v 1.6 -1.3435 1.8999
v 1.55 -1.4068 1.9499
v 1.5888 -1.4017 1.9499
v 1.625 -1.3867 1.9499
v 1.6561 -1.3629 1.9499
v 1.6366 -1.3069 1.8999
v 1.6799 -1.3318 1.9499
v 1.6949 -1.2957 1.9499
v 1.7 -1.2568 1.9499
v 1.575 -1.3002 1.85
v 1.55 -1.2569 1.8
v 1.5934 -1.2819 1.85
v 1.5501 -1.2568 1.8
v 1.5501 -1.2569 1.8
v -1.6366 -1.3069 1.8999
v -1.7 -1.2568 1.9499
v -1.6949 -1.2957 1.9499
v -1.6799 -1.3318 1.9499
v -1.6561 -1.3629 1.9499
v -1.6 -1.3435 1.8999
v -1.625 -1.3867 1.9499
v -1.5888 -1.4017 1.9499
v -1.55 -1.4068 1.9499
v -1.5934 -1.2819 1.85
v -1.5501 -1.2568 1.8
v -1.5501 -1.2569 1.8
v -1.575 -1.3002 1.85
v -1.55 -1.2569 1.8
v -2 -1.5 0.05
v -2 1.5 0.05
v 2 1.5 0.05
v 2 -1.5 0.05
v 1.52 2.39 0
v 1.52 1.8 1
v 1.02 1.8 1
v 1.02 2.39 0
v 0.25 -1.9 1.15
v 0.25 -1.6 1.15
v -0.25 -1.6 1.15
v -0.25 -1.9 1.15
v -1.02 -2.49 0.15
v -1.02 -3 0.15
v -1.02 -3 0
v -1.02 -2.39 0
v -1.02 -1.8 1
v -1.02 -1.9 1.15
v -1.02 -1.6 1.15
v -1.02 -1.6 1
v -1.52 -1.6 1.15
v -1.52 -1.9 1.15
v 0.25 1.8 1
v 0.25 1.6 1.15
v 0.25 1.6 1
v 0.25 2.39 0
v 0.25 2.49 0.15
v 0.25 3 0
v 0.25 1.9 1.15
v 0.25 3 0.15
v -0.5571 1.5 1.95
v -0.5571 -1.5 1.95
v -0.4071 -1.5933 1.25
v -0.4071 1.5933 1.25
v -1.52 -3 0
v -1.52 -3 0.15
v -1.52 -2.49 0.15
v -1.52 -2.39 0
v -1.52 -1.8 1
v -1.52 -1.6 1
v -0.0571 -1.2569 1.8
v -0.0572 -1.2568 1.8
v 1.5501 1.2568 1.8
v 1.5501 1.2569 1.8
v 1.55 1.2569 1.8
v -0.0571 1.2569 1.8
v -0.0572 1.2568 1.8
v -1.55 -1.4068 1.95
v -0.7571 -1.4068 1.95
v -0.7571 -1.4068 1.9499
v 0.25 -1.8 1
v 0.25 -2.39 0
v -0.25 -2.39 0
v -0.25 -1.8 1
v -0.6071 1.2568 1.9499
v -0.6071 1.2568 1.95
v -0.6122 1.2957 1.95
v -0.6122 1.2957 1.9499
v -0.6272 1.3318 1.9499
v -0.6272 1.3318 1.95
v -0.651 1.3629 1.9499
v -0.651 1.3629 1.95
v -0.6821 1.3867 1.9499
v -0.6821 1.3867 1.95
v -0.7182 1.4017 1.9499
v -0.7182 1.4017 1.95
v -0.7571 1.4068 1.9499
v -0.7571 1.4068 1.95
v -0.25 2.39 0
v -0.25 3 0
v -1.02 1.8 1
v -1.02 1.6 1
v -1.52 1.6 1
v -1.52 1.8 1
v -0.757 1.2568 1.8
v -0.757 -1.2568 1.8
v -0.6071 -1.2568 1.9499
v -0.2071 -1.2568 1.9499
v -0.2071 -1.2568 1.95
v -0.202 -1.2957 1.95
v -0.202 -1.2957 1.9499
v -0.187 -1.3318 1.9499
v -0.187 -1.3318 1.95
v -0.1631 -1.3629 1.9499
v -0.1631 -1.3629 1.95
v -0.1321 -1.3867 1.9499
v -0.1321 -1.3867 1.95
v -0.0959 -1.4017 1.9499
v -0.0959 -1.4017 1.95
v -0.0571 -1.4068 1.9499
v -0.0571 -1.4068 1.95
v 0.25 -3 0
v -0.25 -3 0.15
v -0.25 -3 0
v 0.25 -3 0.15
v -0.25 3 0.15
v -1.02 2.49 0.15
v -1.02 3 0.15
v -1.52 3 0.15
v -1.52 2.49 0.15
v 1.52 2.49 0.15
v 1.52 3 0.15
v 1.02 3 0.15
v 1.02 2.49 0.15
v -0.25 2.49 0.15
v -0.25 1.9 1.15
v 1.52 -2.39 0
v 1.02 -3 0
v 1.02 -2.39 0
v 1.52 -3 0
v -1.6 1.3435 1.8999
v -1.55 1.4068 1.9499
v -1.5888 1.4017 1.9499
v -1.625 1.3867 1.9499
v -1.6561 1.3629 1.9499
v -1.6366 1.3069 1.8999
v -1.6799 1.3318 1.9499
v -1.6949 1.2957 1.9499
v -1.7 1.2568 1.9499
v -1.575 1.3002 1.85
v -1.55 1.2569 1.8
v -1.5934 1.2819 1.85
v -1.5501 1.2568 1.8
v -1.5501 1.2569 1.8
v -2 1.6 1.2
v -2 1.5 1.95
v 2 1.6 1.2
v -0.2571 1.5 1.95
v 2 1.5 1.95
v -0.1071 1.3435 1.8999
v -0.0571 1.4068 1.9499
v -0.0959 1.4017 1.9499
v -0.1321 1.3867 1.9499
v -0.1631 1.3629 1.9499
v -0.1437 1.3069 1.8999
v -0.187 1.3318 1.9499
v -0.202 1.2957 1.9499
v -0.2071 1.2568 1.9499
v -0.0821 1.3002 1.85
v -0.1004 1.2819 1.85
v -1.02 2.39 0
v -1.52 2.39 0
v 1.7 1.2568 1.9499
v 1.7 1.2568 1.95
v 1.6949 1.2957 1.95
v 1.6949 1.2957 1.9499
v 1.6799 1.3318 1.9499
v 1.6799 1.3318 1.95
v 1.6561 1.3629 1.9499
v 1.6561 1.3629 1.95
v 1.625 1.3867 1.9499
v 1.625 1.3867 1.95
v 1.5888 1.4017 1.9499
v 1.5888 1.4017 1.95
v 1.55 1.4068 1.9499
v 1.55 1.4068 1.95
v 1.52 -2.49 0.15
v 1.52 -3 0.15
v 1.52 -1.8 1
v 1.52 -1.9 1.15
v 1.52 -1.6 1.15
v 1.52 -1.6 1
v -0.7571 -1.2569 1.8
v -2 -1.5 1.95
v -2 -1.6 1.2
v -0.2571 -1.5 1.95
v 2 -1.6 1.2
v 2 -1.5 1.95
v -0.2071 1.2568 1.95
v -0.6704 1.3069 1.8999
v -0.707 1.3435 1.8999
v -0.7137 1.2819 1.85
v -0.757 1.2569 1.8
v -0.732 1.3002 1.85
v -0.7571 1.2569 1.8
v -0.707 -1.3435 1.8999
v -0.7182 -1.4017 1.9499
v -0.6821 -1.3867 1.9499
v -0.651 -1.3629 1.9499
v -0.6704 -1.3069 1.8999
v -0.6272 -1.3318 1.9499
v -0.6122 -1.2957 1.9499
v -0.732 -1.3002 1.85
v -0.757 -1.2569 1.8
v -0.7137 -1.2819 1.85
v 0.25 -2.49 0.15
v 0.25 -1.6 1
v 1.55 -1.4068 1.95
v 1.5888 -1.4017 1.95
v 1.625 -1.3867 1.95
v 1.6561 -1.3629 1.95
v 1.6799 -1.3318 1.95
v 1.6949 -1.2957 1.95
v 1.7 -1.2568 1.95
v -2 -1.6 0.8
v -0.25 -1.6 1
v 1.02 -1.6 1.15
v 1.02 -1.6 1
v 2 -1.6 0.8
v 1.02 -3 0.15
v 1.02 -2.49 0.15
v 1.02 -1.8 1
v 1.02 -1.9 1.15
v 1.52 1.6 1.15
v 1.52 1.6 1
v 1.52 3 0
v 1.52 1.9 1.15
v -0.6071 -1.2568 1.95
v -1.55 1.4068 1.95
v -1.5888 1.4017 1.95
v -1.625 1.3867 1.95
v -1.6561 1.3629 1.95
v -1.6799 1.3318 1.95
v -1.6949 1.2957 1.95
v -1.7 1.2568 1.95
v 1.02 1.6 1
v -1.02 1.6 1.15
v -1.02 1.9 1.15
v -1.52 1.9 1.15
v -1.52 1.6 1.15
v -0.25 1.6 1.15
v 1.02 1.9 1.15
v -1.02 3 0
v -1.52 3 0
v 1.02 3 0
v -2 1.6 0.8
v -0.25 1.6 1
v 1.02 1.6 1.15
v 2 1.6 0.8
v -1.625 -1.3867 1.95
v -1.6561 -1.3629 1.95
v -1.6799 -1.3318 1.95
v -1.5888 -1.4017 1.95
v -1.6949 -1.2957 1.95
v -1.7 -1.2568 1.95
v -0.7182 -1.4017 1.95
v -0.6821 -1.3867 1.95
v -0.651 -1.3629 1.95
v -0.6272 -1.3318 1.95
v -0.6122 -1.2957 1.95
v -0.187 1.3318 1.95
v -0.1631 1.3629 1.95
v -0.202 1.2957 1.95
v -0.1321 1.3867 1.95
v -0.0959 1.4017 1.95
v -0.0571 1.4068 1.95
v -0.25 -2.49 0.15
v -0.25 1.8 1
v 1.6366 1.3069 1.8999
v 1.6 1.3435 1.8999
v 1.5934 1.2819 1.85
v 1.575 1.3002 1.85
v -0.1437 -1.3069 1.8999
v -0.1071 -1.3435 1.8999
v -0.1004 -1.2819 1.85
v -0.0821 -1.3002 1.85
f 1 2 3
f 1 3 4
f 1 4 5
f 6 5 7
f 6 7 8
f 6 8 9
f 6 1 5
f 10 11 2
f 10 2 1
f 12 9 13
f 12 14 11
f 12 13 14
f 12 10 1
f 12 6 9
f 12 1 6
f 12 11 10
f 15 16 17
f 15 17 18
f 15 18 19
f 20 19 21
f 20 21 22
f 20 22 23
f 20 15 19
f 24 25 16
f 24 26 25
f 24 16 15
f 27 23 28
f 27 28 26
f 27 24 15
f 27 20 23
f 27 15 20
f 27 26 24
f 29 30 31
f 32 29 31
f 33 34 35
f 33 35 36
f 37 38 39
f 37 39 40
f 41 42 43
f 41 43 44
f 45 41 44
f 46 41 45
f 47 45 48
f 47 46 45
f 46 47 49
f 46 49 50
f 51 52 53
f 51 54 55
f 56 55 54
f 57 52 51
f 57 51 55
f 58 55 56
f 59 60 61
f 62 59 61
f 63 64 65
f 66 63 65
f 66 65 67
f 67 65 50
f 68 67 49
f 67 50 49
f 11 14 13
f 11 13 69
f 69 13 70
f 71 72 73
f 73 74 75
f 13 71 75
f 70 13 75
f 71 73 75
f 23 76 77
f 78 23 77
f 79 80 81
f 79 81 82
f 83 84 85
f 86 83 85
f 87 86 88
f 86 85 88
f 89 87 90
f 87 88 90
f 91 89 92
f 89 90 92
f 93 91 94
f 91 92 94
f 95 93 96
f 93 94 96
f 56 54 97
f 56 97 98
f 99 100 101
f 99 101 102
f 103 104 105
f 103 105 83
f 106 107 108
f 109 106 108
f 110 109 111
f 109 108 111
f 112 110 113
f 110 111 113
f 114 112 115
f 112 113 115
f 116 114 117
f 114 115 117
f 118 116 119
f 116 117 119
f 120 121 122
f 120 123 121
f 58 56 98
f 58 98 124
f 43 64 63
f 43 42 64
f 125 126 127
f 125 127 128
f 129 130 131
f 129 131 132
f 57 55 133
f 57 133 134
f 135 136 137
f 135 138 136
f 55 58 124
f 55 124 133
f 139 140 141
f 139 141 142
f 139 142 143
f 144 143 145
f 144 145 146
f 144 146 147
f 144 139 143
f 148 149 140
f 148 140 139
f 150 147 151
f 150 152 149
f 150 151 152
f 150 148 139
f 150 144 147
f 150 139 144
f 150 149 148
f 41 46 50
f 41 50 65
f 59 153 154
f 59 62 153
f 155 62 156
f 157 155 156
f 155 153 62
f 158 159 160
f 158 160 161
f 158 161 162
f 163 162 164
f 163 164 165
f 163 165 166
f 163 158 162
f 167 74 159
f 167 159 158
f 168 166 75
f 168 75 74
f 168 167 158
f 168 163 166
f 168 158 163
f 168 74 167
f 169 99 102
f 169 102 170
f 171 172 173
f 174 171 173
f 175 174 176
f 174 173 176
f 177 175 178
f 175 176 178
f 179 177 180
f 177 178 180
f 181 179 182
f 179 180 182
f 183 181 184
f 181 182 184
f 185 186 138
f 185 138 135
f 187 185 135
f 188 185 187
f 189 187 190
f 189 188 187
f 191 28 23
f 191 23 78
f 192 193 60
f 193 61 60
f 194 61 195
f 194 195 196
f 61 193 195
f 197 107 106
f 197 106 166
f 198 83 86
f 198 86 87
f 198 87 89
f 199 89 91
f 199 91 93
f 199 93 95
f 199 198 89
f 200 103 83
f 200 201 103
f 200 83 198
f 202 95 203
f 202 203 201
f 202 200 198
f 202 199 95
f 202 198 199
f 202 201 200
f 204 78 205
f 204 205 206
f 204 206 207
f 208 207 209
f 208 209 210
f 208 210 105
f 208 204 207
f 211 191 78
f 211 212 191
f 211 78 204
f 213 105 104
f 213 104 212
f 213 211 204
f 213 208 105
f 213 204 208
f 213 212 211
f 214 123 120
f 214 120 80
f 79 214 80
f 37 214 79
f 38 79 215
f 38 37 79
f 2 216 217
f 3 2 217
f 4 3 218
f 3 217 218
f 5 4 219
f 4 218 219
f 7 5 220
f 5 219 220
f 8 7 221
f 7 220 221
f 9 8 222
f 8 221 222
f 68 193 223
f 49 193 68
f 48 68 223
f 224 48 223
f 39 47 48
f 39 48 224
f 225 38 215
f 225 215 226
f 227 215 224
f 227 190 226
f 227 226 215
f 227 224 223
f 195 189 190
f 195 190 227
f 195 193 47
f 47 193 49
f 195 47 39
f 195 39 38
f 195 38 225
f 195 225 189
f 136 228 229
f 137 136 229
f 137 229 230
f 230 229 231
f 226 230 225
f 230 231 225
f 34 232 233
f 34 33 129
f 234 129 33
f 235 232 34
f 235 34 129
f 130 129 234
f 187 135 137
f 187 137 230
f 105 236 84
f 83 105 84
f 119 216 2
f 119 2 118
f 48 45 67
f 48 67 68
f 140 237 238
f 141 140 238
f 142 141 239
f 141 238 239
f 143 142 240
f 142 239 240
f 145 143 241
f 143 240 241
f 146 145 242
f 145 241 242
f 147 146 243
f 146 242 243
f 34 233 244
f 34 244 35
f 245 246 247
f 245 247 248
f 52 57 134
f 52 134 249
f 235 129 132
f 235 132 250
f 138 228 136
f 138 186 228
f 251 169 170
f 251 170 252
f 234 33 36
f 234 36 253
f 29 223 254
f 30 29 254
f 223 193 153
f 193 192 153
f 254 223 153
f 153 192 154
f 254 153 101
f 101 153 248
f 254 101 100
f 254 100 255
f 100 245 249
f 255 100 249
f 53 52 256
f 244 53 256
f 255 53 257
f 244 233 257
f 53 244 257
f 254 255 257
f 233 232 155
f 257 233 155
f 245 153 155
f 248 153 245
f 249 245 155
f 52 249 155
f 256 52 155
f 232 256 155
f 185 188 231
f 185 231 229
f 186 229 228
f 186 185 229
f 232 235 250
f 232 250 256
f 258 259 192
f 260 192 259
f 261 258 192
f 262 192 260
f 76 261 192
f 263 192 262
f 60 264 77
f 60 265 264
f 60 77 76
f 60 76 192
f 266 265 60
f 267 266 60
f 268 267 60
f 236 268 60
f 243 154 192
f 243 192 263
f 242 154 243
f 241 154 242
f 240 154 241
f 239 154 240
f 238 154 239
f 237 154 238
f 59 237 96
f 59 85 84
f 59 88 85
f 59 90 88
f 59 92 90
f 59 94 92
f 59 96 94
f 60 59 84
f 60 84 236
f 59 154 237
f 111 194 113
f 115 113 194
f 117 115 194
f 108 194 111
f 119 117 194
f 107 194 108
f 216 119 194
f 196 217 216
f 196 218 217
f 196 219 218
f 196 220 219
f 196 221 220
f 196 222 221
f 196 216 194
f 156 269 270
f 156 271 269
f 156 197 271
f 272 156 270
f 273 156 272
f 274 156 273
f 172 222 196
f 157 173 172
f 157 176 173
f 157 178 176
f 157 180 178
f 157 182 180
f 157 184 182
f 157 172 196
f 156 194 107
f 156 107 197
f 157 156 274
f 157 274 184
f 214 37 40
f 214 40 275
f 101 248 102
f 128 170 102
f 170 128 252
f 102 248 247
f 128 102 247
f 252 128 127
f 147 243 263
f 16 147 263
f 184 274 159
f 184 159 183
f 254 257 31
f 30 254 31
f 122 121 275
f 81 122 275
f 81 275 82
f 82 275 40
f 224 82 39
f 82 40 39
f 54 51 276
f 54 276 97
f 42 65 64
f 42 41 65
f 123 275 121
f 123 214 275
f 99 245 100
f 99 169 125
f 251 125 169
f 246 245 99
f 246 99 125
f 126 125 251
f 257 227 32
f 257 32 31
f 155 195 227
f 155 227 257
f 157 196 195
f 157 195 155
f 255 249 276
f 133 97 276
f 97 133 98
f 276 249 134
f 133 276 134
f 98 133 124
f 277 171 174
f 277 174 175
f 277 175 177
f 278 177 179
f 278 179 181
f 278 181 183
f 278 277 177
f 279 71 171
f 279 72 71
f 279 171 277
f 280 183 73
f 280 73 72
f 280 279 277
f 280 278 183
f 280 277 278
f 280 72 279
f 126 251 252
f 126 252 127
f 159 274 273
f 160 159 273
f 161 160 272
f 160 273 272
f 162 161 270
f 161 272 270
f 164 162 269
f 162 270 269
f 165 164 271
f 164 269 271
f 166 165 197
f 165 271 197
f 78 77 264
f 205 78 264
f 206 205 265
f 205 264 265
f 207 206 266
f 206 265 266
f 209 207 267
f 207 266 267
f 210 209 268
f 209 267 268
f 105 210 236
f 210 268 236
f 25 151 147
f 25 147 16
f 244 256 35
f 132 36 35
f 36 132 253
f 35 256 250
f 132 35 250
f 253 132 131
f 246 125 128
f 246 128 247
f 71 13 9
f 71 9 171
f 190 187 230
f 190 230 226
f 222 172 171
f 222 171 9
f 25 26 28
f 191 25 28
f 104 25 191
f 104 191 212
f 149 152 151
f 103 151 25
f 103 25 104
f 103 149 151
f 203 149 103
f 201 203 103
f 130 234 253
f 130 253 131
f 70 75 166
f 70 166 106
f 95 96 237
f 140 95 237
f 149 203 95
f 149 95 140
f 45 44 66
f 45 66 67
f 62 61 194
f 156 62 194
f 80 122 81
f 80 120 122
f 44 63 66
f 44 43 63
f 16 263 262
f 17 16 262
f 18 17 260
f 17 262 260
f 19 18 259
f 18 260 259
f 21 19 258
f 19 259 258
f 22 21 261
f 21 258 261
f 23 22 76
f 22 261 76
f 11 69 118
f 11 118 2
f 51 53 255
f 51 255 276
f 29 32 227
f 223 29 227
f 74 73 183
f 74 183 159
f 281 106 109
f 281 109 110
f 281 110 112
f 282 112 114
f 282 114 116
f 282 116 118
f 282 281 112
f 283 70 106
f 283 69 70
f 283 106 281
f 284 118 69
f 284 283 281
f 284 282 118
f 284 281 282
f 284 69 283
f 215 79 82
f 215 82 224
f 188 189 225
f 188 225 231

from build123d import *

# Parameters (mm, degrees)
PAD002_DEPTH    = 0.25
PAD003_DEPTH    = 0.25
SKETCH_W        = 4
SKETCH_H        = 3.2
PAD_DEPTH       = 0.95
POCKET_DEPTH    = 3.201
POCKET001_DEPTH = 0.15
POCKET002_DEPTH = 20
CHAMFER_SIZE    = 0.1499
PAD001_DEPTH    = 0.25


with BuildPart() as pad002:
    # Sketch003 → Pad002 (new body, symmetric)
    with BuildSketch(Plane.YZ):
        Polygon((-3, 0), (-2.39, 0), (-1.8, 1), (1.8, 1), (2.39, 0), (3, 0), (3, 0.15), (2.49, 0.15), (1.9, 1.15), (-1.9, 1.15), (-2.49, 0.15), (-3, 0.15), align=None)
    extrude(amount=PAD002_DEPTH, both=True)


with BuildPart() as pad003:
    # Sketch004 → Pad003 (new body, symmetric)
    with BuildSketch(Plane.YZ.offset(1.27)):
        Polygon((-3, 0), (-2.39, 0), (-1.8, 1), (1.8, 1), (2.39, 0), (3, 0), (3, 0.15), (2.49, 0.15), (1.9, 1.15), (-1.9, 1.15), (-2.49, 0.15), (-3, 0.15), align=None)
    extrude(amount=PAD003_DEPTH, both=True)


with BuildPart() as chamfer_body:
    # Sketch → Pad (new body, symmetric)
    with BuildSketch(Plane.XY.offset(1)):
        Rectangle(SKETCH_W, SKETCH_H)
    extrude(amount=PAD_DEPTH, both=True)

    # Sketch005 → Pocket (cut, through all)
    with BuildSketch(Plane(origin=(0, -1.6, 1), x_dir=(1, 0, 0), z_dir=(0, -1, 0))):
        Polygon((-0.557062, 0.95), (-0.407062, 0.25), (-0.257062, 0.95), align=None)
    extrude(amount=-POCKET_DEPTH, mode=Mode.SUBTRACT)

    # Sketch006 → Pocket001 (cut)
    with BuildSketch(Plane.XY.offset(1.95)):
        with BuildLine():
            Line((-0.757062, 1.406843), (-1.55, 1.406843))
            ThreePointArc((-1.55, 1.406843), (-1.656066, 1.362909), (-1.7, 1.256843))
            Line((-1.7, 1.256843), (-1.7, -1.256843))
            ThreePointArc((-1.7, -1.256843), (-1.656066, -1.362909), (-1.55, -1.406843))
            Line((-1.55, -1.406843), (-0.757062, -1.406843))
            ThreePointArc((-0.757062, -1.406843), (-0.650996, -1.362909), (-0.607062, -1.256843))
            Line((-0.607062, -1.256843), (-0.607062, 1.256843))
            ThreePointArc((-0.607062, 1.256843), (-0.650996, 1.362909), (-0.757062, 1.406843))
        make_face()
        with BuildLine():
            Line((-0.057062, 1.406843), (1.55, 1.406843))
            ThreePointArc((1.7, 1.256843), (1.656066, 1.362909), (1.55, 1.406843))
            Line((1.7, 1.256843), (1.7, -1.256843))
            ThreePointArc((1.55, -1.406843), (1.656066, -1.362909), (1.7, -1.256843))
            Line((1.55, -1.406843), (-0.057062, -1.406843))
            ThreePointArc((-0.207062, -1.256843), (-0.163128, -1.362909), (-0.057062, -1.406843))
            Line((-0.207062, -1.256843), (-0.207062, 1.256843))
            ThreePointArc((-0.057062, 1.406843), (-0.163128, 1.362909), (-0.207062, 1.256843))
        make_face()
    extrude(amount=-POCKET001_DEPTH, mode=Mode.SUBTRACT)

    # Sketch007 → Pocket002 (cut)
    with BuildSketch(Plane(origin=(2, 0, 1), x_dir=(0, 1, 0), z_dir=(1, 0, 0))):
        Polygon((-1.5, 0.95), (-1.6, 0.95), (-1.6, 0.2), align=None)
        Polygon((-1.6, -0.95), (-1.5, -0.95), (-1.6, -0.2), align=None)
        Polygon((1.6, 0.95), (1.6, 0.2), (1.5, 0.95), align=None)
        Polygon((1.6, -0.95), (1.6, -0.2), (1.5, -0.95), align=None)
    extrude(amount=-POCKET002_DEPTH, mode=Mode.SUBTRACT)

    # Chamfer
    chamfer_edges = [chamfer_body.edges().sort_by_distance(p)[0] for p in [
        (-1.7, 0, 1.8),
        (-1.656066, 1.362909, 1.8),
        (-1.153531, 1.406843, 1.8),
        (-0.163128, 1.362909, 1.8),
        (0.746469, 1.406843, 1.8),
        (-0.207062, 0, 1.8),
        (-1.656066, -1.362909, 1.8),
        (-1.153531, -1.406843, 1.8),
        (-0.650996, -1.362909, 1.8),
        (-0.163128, -1.362909, 1.8),
        (0.746469, -1.406843, 1.8),
        (1.656066, -1.362909, 1.8),
        (1.656066, 1.362909, 1.8),
        (1.7, 0, 1.8),
        (-0.650996, 1.362909, 1.8),
        (-0.607062, 0, 1.8),
    ]]
    chamfer(chamfer_edges, length=CHAMFER_SIZE)


with BuildPart() as osram_sfh9x0x:
    # Sketch002 → Pad001 (new body, symmetric)
    with BuildSketch(Plane.YZ.offset(-1.27)):
        Polygon((-3, 0), (-2.39, 0), (-1.8, 1), (1.8, 1), (2.39, 0), (3, 0), (3, 0.15), (2.49, 0.15), (1.9, 1.15), (-1.9, 1.15), (-2.49, 0.15), (-3, 0.15), align=None)
    extrude(amount=PAD001_DEPTH, both=True)

    # Pad001_mp_cp: union Pad002, Pad003, Chamfer body
    add(pad002.part)
    add(pad003.part)
    add(chamfer_body.part)


solid = osram_sfh9x0x.part
